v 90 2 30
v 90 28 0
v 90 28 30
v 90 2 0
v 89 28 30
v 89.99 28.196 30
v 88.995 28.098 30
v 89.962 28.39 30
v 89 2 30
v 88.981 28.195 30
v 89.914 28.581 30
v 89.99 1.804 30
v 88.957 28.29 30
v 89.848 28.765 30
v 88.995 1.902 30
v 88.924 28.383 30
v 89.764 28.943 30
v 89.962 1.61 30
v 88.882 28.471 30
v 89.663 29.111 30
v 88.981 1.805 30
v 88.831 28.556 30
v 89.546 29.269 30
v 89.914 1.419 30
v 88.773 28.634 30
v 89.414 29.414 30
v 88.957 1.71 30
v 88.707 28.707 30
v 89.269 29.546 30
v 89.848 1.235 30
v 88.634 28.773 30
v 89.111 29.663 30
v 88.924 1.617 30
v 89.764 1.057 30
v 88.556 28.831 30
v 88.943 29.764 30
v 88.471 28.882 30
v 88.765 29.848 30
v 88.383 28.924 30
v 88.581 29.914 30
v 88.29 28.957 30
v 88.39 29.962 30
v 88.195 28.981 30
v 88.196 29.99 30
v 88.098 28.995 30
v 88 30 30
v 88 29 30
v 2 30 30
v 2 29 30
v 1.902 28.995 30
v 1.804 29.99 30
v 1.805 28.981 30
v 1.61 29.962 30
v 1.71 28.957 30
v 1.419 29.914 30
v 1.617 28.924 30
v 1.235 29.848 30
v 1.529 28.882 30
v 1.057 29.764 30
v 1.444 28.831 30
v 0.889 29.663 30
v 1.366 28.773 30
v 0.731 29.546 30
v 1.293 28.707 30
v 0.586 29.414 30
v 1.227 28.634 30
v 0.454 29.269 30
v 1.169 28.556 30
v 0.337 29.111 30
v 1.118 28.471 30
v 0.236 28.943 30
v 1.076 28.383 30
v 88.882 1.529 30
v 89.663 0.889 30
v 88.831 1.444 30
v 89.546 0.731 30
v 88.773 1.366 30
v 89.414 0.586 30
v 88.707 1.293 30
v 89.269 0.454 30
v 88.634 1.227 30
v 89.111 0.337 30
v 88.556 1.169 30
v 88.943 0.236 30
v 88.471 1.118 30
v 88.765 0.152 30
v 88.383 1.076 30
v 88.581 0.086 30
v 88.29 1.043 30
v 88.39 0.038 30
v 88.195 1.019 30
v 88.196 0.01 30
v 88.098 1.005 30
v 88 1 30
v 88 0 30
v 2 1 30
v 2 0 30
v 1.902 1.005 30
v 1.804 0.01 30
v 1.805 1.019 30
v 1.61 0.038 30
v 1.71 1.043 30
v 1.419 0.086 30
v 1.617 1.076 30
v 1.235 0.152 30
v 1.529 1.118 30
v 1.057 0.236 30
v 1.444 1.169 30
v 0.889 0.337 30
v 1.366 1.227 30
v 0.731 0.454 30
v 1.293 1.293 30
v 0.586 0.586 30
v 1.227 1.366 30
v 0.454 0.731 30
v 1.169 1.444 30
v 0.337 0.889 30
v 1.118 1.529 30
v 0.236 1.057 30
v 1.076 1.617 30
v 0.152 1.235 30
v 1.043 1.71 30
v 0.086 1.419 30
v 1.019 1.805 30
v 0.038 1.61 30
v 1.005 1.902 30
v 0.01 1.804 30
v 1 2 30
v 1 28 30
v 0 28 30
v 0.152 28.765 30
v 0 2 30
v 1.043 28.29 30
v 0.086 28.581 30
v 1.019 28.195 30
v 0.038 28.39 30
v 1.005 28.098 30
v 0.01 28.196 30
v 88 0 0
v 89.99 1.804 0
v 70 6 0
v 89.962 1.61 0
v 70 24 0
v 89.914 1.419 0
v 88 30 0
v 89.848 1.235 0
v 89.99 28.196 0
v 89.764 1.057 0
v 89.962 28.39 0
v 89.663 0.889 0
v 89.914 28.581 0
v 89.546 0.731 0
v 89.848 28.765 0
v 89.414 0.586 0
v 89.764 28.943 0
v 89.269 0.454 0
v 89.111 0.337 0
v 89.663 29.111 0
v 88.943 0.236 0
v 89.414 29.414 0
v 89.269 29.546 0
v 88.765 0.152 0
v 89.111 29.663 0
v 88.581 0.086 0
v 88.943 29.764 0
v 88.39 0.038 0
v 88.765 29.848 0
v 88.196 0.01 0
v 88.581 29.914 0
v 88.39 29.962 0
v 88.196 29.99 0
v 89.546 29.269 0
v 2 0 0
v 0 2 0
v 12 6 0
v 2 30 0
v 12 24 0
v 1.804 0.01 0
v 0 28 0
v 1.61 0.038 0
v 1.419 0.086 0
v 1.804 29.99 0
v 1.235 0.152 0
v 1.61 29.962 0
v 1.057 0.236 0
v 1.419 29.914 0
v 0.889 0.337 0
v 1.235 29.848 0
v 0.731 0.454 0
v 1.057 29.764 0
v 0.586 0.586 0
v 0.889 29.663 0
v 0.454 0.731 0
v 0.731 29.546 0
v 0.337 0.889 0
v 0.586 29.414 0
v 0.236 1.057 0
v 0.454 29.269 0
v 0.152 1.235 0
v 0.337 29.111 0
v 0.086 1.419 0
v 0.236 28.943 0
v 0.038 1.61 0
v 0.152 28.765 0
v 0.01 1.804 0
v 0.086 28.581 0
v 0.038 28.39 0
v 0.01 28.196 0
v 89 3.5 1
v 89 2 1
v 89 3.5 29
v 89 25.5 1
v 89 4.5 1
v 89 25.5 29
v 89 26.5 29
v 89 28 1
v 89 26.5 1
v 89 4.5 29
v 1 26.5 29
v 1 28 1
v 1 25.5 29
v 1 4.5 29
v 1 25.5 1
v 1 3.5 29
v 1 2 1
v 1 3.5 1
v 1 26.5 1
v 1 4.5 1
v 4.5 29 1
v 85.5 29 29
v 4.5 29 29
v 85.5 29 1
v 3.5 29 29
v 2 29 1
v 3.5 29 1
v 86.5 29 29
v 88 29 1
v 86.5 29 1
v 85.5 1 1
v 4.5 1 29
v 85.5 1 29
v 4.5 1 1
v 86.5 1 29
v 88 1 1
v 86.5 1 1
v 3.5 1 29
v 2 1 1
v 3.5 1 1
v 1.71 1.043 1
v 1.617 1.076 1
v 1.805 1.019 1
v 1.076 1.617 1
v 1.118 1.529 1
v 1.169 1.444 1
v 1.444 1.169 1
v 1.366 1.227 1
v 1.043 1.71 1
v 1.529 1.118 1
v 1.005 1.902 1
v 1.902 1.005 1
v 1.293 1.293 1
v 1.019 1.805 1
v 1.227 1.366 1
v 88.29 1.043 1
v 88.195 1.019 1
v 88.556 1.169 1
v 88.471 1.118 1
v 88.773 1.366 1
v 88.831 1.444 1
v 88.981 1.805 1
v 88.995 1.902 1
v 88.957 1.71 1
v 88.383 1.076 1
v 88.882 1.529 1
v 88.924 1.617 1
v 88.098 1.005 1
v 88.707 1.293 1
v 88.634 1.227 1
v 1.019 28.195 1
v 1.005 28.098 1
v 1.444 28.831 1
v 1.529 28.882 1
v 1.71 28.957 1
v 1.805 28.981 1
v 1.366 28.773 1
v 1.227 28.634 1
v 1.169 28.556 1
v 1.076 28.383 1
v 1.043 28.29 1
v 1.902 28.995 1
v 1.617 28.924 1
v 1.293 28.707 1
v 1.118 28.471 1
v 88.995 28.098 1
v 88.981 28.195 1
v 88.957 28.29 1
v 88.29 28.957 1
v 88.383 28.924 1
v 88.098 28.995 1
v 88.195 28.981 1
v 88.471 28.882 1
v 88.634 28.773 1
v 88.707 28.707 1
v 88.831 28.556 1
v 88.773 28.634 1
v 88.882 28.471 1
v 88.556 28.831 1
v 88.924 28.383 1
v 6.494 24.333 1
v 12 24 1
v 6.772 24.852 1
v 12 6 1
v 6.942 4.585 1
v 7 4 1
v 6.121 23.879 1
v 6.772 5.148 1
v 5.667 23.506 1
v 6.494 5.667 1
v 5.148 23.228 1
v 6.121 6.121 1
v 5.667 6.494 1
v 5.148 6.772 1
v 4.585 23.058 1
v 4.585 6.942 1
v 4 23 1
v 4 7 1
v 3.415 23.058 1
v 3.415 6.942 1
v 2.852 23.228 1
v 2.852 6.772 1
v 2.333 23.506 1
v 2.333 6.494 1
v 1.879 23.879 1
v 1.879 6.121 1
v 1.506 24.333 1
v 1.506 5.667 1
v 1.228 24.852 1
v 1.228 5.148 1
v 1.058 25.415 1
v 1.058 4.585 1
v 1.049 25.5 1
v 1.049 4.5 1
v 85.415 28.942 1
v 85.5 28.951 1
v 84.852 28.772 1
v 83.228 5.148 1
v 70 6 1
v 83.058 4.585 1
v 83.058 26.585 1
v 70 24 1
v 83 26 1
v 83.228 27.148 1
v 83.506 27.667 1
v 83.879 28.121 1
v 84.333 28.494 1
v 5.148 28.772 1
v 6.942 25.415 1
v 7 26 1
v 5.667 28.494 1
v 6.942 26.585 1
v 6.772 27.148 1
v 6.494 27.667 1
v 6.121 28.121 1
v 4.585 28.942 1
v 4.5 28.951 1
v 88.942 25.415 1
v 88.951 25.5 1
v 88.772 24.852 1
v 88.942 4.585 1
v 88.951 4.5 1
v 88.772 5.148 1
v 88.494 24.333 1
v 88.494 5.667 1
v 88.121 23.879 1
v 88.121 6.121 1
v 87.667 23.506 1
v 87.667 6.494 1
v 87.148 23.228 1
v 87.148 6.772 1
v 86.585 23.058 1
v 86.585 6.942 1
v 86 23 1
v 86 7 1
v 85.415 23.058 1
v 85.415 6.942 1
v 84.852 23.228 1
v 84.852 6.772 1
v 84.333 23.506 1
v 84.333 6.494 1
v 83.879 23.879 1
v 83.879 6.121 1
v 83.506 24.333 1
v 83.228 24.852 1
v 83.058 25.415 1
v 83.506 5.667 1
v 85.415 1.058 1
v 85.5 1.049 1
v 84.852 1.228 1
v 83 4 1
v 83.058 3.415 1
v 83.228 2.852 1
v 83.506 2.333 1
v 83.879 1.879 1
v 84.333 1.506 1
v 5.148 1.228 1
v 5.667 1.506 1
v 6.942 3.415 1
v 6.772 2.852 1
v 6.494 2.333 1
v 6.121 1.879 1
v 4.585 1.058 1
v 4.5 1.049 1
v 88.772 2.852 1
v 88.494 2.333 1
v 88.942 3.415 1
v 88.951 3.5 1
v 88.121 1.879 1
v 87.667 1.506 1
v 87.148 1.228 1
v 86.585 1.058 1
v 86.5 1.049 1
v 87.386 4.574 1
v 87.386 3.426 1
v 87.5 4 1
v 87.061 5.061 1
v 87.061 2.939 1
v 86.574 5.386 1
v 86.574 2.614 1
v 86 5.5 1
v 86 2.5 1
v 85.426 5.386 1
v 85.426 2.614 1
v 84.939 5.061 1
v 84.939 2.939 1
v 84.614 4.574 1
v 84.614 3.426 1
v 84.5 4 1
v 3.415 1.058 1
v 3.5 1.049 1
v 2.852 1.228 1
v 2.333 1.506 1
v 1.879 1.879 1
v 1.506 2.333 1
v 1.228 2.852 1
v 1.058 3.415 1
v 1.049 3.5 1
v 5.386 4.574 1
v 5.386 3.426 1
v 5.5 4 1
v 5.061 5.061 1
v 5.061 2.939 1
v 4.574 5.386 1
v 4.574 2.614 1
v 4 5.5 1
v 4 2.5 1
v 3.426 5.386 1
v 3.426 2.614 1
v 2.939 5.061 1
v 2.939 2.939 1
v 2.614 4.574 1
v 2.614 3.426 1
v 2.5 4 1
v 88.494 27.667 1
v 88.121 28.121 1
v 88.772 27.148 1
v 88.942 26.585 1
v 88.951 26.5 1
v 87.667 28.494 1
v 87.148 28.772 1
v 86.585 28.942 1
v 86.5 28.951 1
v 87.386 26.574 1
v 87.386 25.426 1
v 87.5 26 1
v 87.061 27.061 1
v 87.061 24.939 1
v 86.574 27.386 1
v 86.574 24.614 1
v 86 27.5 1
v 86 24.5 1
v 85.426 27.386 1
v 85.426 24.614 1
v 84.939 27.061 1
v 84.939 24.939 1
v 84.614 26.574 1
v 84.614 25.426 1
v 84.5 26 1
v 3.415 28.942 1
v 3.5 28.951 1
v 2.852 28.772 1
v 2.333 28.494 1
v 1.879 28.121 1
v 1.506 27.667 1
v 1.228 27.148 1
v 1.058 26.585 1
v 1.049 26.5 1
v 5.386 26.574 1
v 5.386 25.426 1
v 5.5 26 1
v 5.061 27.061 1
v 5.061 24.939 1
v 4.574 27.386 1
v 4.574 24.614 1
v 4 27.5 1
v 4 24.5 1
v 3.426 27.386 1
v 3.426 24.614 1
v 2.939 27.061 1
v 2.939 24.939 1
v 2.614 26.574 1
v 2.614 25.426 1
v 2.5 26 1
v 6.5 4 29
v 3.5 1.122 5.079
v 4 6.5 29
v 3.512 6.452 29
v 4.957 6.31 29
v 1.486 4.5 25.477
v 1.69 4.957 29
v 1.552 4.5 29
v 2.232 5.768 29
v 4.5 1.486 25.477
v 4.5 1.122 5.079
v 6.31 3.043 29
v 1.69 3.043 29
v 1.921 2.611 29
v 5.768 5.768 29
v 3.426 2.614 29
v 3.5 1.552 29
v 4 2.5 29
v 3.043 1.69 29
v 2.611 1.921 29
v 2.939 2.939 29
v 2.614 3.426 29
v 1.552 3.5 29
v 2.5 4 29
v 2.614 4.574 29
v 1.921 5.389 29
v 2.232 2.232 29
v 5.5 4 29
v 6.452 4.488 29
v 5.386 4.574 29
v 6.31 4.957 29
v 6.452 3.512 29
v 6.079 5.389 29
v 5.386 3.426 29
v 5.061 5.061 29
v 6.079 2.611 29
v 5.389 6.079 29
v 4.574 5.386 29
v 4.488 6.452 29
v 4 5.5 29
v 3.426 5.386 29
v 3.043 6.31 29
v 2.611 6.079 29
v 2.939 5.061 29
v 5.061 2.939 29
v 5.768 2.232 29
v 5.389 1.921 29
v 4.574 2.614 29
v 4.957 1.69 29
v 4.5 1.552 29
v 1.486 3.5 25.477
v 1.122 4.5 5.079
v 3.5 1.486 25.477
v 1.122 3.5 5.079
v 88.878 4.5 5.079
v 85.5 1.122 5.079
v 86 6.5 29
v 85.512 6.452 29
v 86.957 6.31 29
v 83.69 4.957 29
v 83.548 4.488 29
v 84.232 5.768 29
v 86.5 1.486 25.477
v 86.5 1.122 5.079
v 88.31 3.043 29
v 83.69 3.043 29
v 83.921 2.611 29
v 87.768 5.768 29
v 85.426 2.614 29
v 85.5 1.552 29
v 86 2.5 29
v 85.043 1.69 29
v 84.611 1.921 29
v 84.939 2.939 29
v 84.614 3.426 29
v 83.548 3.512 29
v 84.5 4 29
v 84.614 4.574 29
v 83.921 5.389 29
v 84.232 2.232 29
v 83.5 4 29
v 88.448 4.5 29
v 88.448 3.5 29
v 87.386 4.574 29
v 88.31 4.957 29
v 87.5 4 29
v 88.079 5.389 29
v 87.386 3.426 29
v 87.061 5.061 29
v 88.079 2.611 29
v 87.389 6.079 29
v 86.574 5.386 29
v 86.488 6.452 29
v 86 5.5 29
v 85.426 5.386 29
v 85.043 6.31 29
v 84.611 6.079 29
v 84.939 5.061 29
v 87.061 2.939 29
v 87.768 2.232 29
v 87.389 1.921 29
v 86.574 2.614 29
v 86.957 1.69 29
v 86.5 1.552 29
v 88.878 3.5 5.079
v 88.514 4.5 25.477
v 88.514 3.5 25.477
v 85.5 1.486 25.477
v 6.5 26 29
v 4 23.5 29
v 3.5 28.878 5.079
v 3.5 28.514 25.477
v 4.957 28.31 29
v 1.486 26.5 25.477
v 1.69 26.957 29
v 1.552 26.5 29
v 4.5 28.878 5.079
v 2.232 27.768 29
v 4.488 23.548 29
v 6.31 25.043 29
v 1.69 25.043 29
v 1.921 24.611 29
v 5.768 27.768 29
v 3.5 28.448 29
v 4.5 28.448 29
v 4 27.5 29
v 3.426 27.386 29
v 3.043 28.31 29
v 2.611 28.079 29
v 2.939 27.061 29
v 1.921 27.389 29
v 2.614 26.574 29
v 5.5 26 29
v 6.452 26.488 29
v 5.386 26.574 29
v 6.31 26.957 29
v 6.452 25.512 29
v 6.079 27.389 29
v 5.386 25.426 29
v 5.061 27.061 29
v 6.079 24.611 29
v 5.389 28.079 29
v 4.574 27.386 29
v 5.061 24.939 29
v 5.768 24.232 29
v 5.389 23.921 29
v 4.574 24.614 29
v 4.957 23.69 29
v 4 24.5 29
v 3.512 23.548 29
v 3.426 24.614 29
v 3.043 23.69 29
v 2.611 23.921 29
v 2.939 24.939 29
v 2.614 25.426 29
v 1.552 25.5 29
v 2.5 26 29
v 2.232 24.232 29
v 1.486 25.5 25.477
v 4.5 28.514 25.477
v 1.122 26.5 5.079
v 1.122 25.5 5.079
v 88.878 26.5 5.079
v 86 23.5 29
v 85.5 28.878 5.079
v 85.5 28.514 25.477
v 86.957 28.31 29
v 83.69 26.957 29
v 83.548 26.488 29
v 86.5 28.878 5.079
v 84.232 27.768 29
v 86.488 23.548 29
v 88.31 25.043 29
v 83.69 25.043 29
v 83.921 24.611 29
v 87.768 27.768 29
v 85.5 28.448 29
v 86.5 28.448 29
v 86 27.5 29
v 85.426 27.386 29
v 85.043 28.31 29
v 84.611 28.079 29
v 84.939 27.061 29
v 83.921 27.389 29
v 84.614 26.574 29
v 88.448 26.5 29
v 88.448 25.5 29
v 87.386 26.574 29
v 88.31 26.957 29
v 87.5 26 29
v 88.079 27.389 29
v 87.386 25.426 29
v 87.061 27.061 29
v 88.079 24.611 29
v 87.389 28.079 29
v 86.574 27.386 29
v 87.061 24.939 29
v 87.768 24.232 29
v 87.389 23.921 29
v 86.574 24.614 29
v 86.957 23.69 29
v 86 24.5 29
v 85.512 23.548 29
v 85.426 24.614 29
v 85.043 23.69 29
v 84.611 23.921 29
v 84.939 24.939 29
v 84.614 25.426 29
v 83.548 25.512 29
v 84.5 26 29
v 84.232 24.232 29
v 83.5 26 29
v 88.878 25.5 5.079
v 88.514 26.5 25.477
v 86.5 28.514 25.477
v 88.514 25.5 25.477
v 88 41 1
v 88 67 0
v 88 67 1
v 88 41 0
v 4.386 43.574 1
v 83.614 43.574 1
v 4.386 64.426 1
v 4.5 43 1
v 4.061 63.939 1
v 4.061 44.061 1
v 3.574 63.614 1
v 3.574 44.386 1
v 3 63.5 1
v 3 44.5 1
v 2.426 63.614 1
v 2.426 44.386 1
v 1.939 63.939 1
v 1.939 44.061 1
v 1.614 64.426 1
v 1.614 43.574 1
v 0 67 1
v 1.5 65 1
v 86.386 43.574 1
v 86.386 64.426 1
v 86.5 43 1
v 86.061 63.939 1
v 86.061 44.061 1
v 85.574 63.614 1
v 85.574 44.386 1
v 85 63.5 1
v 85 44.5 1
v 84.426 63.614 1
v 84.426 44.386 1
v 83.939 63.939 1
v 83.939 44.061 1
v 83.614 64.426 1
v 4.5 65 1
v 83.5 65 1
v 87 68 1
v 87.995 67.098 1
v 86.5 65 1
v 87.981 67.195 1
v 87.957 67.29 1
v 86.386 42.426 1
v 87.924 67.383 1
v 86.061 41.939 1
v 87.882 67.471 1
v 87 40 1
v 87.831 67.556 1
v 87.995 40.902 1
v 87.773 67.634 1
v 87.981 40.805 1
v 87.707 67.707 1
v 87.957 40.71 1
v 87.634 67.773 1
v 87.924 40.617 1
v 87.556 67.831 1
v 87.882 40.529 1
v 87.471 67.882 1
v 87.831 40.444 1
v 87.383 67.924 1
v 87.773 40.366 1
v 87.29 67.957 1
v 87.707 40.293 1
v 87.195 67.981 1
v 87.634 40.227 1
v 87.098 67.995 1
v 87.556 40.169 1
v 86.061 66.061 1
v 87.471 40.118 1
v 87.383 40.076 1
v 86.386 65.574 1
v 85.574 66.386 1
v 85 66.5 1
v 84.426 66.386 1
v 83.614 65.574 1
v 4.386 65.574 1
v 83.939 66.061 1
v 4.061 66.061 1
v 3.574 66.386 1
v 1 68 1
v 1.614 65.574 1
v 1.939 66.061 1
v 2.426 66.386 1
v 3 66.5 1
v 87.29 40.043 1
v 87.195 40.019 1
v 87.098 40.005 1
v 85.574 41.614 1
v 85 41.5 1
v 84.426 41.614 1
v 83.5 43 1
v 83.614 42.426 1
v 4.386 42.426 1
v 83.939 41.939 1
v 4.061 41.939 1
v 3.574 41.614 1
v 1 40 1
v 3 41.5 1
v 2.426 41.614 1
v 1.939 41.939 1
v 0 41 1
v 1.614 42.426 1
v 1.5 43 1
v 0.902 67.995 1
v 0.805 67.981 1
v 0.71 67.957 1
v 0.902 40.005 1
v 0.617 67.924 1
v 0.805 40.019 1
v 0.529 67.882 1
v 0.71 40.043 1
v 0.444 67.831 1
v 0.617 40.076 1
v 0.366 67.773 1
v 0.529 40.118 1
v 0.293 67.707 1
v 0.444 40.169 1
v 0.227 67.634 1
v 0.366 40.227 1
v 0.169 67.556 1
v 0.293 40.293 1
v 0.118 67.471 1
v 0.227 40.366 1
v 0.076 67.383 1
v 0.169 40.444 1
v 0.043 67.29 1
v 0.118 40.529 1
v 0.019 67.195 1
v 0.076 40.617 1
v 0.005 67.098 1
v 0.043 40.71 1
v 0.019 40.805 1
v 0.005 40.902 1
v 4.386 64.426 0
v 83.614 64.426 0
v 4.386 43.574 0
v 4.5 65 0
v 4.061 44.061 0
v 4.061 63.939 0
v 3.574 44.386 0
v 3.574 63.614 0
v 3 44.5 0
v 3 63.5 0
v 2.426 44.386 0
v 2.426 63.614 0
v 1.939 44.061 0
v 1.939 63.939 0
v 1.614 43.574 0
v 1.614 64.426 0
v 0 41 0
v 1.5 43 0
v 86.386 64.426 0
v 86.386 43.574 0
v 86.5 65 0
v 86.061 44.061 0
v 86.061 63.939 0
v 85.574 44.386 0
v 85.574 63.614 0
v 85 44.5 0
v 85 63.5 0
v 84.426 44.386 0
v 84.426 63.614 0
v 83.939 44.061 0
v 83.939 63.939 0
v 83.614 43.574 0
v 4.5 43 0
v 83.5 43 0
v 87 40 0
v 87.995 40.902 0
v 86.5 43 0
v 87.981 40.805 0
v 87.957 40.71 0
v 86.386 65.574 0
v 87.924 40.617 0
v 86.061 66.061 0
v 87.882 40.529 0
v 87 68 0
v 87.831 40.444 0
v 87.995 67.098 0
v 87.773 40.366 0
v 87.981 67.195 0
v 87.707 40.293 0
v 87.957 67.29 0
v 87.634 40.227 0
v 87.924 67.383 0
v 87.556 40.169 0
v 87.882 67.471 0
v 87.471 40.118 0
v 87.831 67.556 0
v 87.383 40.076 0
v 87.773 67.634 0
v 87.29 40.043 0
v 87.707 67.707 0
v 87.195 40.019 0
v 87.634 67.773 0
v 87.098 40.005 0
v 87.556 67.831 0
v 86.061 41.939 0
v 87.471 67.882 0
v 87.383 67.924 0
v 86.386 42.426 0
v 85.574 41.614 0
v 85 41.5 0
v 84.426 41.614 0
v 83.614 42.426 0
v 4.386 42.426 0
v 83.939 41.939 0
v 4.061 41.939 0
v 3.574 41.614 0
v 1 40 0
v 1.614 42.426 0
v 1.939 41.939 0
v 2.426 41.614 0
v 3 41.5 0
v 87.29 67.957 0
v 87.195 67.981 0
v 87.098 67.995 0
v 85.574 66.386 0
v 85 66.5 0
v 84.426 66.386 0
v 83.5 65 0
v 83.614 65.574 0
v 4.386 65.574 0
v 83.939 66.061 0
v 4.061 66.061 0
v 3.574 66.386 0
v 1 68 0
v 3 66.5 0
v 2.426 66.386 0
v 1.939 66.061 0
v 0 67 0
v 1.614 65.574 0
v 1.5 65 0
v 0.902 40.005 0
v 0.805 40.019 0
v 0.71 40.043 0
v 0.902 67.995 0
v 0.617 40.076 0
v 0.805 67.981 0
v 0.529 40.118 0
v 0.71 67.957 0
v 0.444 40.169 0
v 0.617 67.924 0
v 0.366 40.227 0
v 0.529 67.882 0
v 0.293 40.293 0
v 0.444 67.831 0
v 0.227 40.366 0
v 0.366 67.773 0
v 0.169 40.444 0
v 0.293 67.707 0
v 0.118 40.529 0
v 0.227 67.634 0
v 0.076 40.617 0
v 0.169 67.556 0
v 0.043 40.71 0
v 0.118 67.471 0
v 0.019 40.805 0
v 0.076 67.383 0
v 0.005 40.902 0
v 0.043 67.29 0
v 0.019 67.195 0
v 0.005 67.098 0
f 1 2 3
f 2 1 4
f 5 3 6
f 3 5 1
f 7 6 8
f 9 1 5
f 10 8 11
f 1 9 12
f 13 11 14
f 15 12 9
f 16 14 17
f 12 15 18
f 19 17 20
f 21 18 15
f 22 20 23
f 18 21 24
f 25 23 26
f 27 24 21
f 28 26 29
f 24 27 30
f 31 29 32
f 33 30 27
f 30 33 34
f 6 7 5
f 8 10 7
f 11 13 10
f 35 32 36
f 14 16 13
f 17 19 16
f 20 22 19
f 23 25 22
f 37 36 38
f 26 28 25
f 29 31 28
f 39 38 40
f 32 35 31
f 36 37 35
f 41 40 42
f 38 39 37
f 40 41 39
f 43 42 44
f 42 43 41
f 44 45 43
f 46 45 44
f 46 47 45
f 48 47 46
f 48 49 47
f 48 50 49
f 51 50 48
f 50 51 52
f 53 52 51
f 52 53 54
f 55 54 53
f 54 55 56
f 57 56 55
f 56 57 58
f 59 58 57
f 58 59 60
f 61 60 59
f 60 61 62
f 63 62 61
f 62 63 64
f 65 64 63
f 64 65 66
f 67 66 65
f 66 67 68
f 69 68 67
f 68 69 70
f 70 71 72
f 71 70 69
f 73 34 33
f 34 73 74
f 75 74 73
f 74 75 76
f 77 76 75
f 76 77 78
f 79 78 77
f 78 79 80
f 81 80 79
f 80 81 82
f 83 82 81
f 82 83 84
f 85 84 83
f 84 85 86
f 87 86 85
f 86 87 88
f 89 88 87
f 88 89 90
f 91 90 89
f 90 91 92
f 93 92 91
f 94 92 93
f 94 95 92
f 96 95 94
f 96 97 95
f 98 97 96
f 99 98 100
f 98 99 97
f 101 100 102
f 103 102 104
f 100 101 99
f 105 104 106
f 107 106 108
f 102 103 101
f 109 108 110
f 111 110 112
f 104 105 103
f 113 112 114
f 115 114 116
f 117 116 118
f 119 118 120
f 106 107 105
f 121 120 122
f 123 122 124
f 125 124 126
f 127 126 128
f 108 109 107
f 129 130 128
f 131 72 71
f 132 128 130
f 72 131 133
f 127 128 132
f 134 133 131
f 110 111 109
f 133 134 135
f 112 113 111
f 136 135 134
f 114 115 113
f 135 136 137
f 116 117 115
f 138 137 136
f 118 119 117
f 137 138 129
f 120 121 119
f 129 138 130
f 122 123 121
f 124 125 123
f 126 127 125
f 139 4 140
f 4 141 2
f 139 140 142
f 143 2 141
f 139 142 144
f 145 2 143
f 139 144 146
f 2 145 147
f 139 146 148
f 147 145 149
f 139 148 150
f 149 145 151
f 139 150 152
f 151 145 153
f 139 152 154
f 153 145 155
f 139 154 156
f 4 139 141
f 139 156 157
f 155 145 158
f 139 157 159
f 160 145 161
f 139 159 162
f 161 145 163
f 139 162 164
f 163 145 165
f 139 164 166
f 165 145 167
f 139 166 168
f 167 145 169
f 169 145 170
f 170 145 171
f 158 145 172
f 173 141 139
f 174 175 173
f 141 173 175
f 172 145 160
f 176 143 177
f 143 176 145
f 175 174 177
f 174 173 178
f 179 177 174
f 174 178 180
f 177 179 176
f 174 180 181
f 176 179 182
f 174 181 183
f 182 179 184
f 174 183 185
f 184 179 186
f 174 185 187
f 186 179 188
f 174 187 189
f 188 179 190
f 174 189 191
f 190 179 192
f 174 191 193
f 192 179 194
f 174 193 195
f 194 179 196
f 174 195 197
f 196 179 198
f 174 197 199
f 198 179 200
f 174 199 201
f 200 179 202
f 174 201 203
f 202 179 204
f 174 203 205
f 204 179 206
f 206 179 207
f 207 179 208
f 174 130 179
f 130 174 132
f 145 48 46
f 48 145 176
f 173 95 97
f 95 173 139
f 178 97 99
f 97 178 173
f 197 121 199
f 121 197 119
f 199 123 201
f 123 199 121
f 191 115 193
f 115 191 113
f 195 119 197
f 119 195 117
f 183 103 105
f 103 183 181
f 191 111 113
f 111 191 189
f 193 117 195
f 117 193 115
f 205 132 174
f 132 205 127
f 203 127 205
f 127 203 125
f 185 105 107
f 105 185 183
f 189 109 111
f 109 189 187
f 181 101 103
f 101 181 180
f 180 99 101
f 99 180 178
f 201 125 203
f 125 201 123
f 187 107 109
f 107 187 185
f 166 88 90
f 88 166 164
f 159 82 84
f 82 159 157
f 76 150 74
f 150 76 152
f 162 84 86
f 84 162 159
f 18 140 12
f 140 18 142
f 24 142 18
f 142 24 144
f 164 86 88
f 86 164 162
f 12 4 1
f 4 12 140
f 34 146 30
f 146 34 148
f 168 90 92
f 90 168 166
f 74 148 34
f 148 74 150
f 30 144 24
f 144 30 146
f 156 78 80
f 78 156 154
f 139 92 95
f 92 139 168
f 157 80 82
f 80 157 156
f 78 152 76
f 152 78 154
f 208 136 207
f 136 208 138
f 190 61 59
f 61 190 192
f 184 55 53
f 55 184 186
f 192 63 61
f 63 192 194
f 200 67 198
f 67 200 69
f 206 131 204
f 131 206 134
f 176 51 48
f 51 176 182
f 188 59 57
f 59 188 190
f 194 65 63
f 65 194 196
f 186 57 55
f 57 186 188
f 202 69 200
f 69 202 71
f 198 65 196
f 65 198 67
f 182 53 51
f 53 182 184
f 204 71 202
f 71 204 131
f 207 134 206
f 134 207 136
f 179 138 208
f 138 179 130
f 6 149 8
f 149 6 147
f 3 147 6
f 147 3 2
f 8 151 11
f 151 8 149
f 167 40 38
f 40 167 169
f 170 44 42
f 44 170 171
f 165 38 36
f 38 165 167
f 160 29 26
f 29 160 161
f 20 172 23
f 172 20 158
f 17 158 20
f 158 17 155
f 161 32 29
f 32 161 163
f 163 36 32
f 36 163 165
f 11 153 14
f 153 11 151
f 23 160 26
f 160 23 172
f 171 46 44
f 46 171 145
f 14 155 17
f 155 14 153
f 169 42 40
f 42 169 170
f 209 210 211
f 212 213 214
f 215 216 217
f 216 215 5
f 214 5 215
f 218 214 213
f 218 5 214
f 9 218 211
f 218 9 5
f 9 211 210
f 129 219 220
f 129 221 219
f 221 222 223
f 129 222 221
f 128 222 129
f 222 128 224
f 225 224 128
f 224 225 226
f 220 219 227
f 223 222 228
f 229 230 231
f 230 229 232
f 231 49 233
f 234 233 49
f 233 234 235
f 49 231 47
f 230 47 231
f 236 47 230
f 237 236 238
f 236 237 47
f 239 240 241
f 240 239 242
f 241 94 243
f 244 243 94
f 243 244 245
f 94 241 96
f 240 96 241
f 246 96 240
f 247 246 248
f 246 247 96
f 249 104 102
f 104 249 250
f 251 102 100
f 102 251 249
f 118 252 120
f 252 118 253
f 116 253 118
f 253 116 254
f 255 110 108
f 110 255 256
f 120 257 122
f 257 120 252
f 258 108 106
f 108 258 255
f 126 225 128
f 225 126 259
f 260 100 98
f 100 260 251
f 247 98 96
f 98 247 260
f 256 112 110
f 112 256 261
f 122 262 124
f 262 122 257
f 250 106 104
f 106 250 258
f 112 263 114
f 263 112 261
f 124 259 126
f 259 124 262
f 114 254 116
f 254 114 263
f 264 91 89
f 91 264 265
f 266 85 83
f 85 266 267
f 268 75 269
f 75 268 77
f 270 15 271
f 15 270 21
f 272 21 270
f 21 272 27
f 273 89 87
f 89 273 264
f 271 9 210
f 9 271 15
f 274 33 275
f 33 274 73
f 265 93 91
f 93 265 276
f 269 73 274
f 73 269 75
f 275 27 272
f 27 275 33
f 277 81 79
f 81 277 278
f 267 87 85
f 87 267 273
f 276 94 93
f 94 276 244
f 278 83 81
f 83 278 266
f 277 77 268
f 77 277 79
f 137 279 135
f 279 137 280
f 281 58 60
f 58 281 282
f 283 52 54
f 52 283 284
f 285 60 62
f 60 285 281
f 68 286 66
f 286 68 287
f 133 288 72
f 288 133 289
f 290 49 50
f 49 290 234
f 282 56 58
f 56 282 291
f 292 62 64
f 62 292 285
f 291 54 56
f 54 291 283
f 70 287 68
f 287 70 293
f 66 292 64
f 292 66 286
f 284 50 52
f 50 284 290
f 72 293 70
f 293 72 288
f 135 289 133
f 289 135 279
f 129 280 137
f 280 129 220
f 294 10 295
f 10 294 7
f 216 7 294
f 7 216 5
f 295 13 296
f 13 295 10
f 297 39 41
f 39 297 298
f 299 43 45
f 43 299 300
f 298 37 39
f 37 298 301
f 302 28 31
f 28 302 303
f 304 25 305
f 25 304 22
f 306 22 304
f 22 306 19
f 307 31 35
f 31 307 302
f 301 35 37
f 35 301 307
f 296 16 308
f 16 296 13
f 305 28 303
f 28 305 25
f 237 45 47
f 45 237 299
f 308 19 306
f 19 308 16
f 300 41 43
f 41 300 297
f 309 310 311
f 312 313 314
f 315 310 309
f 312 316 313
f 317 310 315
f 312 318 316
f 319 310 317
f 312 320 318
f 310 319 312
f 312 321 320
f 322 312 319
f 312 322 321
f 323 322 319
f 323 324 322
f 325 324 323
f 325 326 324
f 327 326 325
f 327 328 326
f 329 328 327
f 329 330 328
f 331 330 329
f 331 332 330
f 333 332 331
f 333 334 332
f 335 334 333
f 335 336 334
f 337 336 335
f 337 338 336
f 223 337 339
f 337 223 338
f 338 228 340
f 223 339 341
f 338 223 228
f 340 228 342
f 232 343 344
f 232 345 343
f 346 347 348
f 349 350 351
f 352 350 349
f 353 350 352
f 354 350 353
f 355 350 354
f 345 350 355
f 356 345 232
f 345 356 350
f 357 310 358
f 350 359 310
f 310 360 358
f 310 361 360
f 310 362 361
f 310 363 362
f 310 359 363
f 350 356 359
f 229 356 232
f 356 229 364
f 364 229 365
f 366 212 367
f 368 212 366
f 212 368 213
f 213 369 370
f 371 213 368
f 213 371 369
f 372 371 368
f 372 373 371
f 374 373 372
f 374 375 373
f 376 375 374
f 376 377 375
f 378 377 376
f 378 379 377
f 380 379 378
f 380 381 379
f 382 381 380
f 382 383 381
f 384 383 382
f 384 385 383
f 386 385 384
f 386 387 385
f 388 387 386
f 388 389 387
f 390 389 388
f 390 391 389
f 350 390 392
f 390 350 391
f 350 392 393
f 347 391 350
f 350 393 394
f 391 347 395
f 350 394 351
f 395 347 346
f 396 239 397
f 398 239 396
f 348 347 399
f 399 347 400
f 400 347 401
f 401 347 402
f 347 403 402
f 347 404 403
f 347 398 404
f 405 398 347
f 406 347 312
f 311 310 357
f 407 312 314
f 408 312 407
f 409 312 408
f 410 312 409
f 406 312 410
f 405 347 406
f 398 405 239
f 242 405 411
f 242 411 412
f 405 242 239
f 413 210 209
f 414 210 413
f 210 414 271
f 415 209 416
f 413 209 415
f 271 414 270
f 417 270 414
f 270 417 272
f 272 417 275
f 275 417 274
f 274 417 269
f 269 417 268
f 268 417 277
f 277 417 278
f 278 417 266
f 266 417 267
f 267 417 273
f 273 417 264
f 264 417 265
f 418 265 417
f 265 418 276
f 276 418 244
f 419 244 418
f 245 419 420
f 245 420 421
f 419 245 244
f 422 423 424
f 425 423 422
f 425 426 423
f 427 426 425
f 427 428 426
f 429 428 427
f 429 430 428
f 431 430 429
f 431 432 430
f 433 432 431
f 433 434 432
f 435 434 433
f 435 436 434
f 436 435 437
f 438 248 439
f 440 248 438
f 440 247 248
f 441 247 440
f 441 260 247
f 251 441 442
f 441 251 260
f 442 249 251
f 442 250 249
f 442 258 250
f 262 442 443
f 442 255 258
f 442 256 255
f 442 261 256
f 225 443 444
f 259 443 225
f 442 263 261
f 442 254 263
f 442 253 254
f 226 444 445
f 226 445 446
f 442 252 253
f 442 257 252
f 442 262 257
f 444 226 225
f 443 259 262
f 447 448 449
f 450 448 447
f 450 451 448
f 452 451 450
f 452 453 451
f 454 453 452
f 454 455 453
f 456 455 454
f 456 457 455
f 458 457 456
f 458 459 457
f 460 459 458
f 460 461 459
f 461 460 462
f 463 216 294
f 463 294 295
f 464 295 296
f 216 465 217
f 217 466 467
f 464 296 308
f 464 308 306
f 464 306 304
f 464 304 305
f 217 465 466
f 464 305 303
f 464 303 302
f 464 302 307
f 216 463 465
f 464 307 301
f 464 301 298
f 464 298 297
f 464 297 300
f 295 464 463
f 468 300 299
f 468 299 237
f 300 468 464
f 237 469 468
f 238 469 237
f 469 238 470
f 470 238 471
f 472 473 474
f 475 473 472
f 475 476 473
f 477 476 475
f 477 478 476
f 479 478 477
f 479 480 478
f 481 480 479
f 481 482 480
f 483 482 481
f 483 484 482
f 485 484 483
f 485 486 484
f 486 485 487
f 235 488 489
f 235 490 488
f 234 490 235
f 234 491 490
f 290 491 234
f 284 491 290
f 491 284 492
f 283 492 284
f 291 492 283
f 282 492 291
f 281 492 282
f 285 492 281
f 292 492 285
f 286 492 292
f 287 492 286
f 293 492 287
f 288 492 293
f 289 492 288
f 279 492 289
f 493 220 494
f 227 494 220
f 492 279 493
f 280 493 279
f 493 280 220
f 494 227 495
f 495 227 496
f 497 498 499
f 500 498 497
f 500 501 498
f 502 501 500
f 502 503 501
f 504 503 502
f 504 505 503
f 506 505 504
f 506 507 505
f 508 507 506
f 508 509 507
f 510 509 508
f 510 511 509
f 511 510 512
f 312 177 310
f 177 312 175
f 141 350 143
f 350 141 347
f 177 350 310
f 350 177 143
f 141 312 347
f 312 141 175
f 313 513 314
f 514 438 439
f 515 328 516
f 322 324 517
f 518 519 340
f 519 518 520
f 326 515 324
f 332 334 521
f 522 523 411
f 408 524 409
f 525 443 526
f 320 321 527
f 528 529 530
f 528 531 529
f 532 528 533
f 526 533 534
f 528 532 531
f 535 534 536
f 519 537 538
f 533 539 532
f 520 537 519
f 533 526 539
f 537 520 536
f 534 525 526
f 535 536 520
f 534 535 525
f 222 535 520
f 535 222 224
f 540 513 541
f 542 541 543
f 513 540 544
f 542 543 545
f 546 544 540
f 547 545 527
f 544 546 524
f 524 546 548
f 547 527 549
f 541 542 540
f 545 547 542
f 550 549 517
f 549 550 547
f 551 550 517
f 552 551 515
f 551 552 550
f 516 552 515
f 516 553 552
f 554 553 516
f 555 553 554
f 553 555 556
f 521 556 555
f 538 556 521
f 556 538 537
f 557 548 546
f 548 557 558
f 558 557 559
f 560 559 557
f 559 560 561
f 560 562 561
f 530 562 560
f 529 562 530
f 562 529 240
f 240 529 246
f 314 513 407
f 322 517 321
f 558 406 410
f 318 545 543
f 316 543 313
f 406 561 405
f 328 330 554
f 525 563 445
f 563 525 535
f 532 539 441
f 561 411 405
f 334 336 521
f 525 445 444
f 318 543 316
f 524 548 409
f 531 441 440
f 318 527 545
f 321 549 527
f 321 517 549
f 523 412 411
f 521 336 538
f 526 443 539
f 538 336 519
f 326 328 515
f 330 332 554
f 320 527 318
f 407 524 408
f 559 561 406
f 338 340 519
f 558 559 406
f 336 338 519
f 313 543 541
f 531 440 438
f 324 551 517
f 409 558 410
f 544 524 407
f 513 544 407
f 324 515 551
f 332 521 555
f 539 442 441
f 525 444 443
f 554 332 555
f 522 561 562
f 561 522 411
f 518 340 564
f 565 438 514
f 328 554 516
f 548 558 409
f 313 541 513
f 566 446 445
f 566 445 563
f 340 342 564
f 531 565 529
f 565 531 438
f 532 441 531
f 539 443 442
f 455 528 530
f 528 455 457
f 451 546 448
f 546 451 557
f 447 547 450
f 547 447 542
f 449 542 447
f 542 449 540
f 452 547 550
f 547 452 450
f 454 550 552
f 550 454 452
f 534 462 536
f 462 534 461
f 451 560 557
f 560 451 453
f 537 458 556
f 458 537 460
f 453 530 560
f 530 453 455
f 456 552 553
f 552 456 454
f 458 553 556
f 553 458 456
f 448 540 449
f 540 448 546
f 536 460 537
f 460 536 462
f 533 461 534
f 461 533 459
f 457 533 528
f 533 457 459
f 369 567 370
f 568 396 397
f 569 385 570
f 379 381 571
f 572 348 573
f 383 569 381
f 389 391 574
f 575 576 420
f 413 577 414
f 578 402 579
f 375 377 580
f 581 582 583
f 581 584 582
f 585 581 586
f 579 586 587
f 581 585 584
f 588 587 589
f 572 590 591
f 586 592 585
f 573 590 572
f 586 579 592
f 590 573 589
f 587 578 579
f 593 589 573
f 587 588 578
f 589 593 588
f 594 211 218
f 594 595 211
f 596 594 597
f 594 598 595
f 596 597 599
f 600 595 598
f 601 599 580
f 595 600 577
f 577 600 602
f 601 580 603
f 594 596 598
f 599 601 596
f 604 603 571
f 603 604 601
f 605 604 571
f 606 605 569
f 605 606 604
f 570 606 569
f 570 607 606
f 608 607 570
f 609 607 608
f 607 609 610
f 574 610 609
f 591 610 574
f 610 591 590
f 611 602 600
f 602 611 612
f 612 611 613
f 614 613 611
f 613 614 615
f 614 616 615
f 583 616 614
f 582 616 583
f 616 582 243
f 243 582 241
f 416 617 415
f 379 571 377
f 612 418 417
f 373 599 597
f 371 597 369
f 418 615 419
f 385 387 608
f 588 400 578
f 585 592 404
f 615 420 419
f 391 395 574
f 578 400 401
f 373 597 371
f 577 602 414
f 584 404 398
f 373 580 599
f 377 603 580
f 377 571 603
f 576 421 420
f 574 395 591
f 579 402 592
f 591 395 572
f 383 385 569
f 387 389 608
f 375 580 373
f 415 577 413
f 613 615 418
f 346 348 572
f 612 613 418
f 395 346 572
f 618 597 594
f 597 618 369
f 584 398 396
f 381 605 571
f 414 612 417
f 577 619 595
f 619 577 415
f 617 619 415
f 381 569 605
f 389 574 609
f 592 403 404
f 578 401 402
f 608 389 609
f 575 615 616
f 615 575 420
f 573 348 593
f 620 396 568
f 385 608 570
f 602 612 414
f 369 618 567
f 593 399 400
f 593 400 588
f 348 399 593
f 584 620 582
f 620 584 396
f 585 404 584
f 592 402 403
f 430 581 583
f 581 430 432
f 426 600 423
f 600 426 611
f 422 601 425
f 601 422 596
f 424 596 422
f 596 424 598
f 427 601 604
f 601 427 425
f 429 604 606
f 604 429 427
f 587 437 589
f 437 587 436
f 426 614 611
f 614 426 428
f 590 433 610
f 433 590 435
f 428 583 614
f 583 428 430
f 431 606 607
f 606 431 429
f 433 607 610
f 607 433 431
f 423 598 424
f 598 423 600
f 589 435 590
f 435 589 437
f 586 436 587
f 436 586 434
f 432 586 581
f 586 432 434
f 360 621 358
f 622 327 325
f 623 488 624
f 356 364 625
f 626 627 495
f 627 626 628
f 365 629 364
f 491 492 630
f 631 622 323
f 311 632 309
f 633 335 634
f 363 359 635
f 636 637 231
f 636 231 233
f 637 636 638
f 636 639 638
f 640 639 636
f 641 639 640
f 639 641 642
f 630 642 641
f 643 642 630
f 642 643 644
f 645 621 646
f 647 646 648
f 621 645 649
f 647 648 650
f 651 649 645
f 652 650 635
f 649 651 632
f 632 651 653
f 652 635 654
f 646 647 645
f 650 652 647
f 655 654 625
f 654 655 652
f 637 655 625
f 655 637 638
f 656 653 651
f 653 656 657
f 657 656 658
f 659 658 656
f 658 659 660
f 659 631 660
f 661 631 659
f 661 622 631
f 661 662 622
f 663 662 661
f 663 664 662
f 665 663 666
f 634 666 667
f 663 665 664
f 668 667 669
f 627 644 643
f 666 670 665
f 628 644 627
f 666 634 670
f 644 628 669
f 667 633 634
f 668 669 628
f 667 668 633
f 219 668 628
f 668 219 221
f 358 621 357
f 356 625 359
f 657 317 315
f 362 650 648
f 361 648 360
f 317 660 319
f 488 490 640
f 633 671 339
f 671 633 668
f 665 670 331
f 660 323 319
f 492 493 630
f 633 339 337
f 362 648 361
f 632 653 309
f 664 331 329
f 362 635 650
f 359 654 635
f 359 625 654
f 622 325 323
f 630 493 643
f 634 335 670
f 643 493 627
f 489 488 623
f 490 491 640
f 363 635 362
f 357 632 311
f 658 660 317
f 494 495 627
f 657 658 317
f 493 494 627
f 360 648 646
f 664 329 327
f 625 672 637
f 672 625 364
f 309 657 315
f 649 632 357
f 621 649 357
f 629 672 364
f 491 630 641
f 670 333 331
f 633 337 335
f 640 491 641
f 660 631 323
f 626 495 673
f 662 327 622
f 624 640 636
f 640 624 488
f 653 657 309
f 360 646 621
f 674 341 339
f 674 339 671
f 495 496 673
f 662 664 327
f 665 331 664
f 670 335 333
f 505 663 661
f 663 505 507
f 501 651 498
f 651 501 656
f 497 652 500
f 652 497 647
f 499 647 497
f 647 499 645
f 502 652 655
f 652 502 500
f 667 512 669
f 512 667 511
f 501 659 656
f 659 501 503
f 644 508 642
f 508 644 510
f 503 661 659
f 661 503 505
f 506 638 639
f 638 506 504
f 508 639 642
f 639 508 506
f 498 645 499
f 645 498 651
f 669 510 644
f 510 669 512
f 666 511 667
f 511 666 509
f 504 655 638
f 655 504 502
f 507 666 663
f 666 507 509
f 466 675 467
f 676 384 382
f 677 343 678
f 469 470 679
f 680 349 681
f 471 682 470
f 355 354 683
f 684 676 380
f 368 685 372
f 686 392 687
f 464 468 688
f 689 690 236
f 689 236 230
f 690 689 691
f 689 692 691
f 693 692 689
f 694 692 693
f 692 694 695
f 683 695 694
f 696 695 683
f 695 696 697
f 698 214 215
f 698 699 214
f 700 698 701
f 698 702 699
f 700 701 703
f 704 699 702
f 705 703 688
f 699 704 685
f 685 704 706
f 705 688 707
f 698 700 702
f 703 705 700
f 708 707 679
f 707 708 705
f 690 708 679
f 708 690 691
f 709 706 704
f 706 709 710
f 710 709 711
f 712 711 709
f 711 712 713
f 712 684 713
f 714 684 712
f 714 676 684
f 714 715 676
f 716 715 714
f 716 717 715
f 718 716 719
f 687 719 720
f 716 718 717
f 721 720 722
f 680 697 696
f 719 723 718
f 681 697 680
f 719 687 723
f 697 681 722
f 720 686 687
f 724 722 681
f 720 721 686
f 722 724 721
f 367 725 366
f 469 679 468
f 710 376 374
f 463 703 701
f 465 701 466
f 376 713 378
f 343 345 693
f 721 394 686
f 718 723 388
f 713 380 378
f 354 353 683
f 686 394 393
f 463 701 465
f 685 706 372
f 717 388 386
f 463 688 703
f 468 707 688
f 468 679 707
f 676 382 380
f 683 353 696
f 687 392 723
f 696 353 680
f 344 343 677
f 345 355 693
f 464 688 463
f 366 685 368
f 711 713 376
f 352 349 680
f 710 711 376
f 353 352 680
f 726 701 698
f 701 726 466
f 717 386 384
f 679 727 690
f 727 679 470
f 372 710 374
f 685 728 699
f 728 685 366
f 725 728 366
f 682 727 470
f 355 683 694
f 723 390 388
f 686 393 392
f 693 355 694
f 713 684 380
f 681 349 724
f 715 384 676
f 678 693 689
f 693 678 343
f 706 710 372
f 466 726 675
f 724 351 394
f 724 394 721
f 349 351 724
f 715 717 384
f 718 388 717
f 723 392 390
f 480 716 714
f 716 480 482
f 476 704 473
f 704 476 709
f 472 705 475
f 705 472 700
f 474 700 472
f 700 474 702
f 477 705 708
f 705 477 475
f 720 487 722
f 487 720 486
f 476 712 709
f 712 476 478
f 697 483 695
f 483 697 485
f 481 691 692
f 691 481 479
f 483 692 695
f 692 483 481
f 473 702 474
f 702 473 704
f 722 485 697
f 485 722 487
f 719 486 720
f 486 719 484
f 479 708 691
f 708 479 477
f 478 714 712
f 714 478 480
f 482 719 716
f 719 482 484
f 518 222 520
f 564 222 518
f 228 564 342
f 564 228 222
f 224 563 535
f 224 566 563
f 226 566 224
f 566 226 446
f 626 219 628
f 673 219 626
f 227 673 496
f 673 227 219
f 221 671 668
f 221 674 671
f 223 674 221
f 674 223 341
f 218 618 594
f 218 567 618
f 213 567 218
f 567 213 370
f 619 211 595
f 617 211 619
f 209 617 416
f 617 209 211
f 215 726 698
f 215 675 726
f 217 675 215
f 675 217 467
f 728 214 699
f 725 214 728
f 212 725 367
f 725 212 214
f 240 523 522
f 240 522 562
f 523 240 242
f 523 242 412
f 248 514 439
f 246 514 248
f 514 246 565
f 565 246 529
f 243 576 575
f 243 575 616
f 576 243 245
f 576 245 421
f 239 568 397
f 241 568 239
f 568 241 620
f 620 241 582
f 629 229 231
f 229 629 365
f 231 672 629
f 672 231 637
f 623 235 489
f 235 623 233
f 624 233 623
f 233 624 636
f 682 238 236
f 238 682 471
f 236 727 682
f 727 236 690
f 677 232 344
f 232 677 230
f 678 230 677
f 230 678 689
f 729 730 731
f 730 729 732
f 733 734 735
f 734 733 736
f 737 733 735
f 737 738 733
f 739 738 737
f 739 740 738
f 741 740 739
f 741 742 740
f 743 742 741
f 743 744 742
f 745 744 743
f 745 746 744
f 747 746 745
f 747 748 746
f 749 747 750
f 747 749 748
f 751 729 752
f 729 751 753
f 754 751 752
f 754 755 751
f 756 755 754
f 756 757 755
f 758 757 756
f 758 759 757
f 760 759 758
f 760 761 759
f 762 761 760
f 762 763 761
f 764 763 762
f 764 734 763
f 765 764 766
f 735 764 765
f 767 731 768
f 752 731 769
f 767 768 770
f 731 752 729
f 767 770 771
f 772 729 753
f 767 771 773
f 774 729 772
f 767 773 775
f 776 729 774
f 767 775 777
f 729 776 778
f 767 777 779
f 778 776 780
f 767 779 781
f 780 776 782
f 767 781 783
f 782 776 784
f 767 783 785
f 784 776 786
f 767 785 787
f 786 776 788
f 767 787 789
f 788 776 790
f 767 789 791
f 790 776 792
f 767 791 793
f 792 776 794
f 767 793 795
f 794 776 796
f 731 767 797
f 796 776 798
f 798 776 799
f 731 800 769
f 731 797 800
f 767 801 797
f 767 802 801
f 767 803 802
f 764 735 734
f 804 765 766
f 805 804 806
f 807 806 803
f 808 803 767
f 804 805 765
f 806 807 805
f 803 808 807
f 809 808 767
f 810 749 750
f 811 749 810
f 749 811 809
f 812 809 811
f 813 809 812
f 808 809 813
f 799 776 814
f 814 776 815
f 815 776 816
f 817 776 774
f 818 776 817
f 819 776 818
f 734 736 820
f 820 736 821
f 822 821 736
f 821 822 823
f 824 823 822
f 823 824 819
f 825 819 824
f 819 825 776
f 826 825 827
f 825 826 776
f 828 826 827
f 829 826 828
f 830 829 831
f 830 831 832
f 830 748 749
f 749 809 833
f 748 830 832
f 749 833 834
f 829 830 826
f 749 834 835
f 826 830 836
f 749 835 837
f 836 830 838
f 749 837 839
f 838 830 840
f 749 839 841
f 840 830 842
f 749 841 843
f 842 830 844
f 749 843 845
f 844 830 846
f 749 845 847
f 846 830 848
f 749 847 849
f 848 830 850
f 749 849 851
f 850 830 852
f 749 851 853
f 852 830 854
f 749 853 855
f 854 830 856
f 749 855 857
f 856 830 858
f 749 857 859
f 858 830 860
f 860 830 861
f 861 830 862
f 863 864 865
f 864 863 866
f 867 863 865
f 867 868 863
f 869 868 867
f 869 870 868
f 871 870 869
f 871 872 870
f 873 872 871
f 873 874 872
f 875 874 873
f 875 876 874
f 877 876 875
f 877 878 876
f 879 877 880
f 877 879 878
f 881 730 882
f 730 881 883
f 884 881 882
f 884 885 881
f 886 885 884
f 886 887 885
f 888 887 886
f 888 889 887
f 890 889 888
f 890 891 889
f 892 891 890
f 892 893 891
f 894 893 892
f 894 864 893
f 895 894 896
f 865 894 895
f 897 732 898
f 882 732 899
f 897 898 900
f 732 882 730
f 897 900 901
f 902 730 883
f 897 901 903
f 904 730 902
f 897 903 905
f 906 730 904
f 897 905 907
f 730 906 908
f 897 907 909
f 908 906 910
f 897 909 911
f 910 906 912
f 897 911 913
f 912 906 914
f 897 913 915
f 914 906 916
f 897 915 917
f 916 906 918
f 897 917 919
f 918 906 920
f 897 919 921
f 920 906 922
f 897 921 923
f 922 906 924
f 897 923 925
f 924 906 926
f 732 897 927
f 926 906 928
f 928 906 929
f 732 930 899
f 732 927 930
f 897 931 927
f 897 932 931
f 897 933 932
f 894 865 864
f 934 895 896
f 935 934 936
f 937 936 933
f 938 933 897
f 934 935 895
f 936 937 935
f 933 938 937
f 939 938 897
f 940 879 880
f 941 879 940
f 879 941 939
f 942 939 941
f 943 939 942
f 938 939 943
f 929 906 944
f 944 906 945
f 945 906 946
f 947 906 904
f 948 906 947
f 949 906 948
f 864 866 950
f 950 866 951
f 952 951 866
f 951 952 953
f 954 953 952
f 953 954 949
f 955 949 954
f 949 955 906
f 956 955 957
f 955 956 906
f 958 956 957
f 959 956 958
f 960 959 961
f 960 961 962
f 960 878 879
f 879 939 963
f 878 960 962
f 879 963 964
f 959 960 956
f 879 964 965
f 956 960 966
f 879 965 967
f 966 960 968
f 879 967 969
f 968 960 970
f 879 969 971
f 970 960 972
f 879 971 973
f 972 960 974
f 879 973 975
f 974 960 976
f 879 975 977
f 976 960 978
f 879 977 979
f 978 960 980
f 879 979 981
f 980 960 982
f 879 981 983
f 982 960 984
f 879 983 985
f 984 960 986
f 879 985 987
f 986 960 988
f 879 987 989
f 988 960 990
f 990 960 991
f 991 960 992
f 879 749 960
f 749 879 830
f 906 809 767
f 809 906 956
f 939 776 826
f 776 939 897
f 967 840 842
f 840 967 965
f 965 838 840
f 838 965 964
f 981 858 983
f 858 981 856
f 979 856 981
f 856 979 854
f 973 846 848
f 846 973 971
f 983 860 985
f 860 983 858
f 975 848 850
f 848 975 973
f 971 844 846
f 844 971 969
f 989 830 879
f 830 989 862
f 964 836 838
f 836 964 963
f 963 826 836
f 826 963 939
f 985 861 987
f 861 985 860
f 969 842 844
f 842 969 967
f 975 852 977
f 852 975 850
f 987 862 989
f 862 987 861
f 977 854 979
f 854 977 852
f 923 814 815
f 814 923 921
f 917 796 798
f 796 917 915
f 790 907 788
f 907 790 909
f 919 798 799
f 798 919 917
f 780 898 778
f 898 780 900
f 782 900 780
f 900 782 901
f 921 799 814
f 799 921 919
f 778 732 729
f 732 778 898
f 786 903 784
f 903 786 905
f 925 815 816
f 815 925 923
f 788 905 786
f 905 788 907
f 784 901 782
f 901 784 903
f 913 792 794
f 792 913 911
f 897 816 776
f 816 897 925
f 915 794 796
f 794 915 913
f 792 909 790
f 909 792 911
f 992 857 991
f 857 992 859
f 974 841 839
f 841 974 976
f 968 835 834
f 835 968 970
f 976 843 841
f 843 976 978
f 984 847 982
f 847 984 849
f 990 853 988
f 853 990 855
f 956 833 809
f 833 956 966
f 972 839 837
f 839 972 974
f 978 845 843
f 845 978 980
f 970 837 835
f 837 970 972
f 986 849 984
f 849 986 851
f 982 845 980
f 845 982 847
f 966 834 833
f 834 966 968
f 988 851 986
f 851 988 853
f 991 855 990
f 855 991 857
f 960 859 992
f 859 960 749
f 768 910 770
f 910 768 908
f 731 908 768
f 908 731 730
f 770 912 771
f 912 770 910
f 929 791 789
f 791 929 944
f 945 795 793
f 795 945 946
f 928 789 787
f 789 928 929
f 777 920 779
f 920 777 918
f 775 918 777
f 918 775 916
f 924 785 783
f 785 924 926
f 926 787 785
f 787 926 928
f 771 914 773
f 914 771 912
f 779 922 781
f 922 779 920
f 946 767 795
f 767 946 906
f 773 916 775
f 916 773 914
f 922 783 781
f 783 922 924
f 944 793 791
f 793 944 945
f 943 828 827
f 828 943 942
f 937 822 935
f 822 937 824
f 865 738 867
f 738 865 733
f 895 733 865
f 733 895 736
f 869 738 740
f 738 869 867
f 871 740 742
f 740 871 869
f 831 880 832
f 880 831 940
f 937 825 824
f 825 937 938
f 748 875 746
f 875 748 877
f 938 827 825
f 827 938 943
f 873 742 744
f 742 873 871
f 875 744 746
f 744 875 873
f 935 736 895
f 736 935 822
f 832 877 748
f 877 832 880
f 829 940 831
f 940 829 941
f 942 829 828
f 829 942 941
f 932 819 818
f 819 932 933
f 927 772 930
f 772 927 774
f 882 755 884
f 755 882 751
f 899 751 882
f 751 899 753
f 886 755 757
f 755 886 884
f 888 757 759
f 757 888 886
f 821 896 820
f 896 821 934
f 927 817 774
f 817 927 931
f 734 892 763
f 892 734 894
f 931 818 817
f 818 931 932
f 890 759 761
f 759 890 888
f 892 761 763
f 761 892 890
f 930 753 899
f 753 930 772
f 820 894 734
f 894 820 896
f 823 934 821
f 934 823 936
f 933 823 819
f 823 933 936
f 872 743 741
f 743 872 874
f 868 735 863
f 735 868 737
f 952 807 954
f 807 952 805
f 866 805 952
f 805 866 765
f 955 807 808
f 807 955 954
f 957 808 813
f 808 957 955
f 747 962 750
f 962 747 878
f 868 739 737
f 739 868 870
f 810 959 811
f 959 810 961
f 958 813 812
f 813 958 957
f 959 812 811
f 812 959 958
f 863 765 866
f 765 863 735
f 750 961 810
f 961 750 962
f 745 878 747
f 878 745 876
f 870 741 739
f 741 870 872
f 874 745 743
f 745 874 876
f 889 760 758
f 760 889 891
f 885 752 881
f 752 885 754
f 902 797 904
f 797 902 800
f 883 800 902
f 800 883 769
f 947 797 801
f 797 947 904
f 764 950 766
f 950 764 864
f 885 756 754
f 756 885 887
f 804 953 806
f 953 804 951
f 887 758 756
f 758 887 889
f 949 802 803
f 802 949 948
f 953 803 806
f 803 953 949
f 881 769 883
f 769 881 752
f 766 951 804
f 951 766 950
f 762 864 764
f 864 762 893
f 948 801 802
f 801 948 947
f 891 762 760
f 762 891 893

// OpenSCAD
//Front plate width
width=90;
//Front plate height
height=30;
//Front plate thickness
thickness=1;
//Front plate corner radius
corner_radius=2;
corner_faces=64;

//Cutout width
cutout_width=58;
//Cutout height
cutout_height=18;
//Cutout corner radius
cutout_corner_radius=0;
cutout_corner_faces=32;
//Horizontal cutout offset from the center of the front plate
cutout_offset_x=-4; //from the center of the front plate
//Vertical cutout offset from the center of the front plate
cutout_offset_y=0; //from the center of the front plate

//Post base radius
post_base_radius=3;
//Post top radius
post_top_radius=2.5;
//Post hole radius
post_hole_radius=1.5;
//Post offsett from case edge
post_offset=4;
//Post support thickness
post_support_thickness=1;

//Rim (case) height 
rim_height=30;
//Rim thickness
rim_thickness=1;

//Backplate thickness
backplate_thickness=1;

parts_immersion=0.2;

//

module body (sizeX, sizeY, sizeZ, cornerRadius, cornerFaces)
{
	union()
	{
		difference()
		{
			cube([sizeX,sizeY,sizeZ]);		
			cube([cornerRadius,cornerRadius,sizeZ+thickness]);
			translate([sizeX-cornerRadius,0,0]) cube([cornerRadius,cornerRadius,sizeZ+thickness]);
			translate([0,sizeY-cornerRadius,0]) cube([cornerRadius,cornerRadius,sizeZ+thickness]);
			translate([sizeX-cornerRadius,sizeY-cornerRadius,0]) cube([cornerRadius,cornerRadius,sizeZ+thickness]);
		}
		translate([cornerRadius,cornerRadius,0]) cylinder(r=cornerRadius,h=sizeZ, $fn=cornerFaces);
		translate([sizeX-cornerRadius,cornerRadius,0]) cylinder(r=cornerRadius,h=sizeZ, $fn=cornerFaces);
		translate([cornerRadius,sizeY-cornerRadius,0]) cylinder(r=cornerRadius,h=sizeZ, $fn=cornerFaces);
		translate([sizeX-cornerRadius,sizeY-cornerRadius,0]) cylinder(r=cornerRadius,h=sizeZ, $fn=cornerFaces);
	}
}

module backplate (sizeX, sizeY, cornerRadius, cornerFaces)
{

    difference()
    {
        union()
        {
            difference()
            {
                cube([sizeX,sizeY,backplate_thickness]);		
                cube([cornerRadius,cornerRadius,backplate_thickness]);
                translate([sizeX-cornerRadius,0,0]) cube([cornerRadius,cornerRadius,backplate_thickness]);
                translate([0,sizeY-cornerRadius,0]) cube([cornerRadius,cornerRadius,backplate_thickness]);
                translate([sizeX-cornerRadius,sizeY-cornerRadius,0]) cube([cornerRadius,cornerRadius,backplate_thickness]);

            }
            translate([cornerRadius,cornerRadius,0]) cylinder(r=cornerRadius,h=backplate_thickness, $fn=cornerFaces);
            translate([sizeX-cornerRadius,cornerRadius,0]) cylinder(r=cornerRadius,h=backplate_thickness, $fn=cornerFaces);
            translate([cornerRadius,sizeY-cornerRadius,0]) cylinder(r=cornerRadius,h=backplate_thickness, $fn=cornerFaces);
            translate([sizeX-cornerRadius,sizeY-cornerRadius,0]) cylinder(r=cornerRadius,h=backplate_thickness, $fn=cornerFaces);
        }

        backplate_holes();
	}
}

module left_post_supports()
{
        //left top support
        translate([0+rim_thickness-parts_immersion,0+post_offset-post_support_thickness/2,thickness]) cube([post_offset-rim_thickness-post_top_radius+parts_immersion*2,post_support_thickness,rim_height-thickness-backplate_thickness]);
        //left bottom support
        translate([0+rim_thickness-parts_immersion,height-post_offset-post_support_thickness/2,thickness]) cube([post_offset-rim_thickness-post_top_radius+parts_immersion*2,post_support_thickness,rim_height-thickness-backplate_thickness]);
    
}

module bottom_post_supports()
{
        //left top support
        translate([0+post_offset-post_support_thickness/2,0+rim_thickness-parts_immersion,thickness]) cube([post_support_thickness,post_offset-rim_thickness-post_top_radius+parts_immersion*2,rim_height-thickness-backplate_thickness]);
        //left bottom support
        translate([0+width-post_offset-post_support_thickness/2,rim_thickness-parts_immersion,thickness]) cube([post_support_thickness,post_offset-rim_thickness-post_top_radius+parts_immersion*2,rim_height-thickness-backplate_thickness]);
}



module posts()
{

	union()
	{
		difference()
		{
            //left bottom post
			translate([0+post_offset,0+post_offset,thickness]) cylinder(r1=post_base_radius,r2=post_top_radius,h=rim_height-thickness-backplate_thickness, $fn=32);	
			translate([0+post_offset,0+post_offset,thickness]) cylinder(r=post_hole_radius,h=rim_height-thickness+0.5, $fn=16);
		}
        
		difference()
		{
            //right bottom post
			translate([width-post_offset,0+post_offset,thickness]) cylinder(r1=post_base_radius,r2=post_top_radius,h=rim_height-thickness-backplate_thickness, $fn=32);	
			translate([width-post_offset,0+post_offset,thickness]) cylinder(r=post_hole_radius,h=rim_height-thickness+0.5, $fn=16);
		}

		difference()
		{
            //left top post
			translate([0+post_offset,height-post_offset,thickness]) cylinder(r1=post_base_radius,r2=post_top_radius,h=rim_height-thickness-backplate_thickness, $fn=32);	
			translate([0+post_offset,height-post_offset,thickness]) cylinder(r=post_hole_radius,h=rim_height-thickness+0.5, $fn=16);
		}	

		difference()
		{
            //right top post
			translate([width-post_offset,height-post_offset,thickness]) cylinder(r1=post_base_radius,r2=post_top_radius,h=rim_height-thickness-backplate_thickness, $fn=32);	
			translate([width-post_offset,height-post_offset,thickness]) cylinder(r=post_hole_radius,h=rim_height-thickness+0.5, $fn=16);
		}
        
        left_post_supports();
        translate([width,0,0]) mirror([1,0,0]) left_post_supports();
        bottom_post_supports();
        translate([0,height,0]) mirror([0,1,0]) bottom_post_supports();
	}
}

module backplate_holes()
{

	union()
	{
            //left bottom hole
			translate([0+post_offset-rim_thickness,0+post_offset-rim_thickness,-0.5]) cylinder(r=post_hole_radius,h=backplate_thickness+1, $fn=16);
            //right bottom hole
			translate([width-post_offset-rim_thickness,0+post_offset-rim_thickness,-0.5]) cylinder(r=post_hole_radius,h=backplate_thickness+1, $fn=16);
            //left top hole
			translate([0+post_offset-rim_thickness,height-post_offset-rim_thickness,-0.5]) cylinder(r=post_hole_radius,h=backplate_thickness+1, $fn=16);
            //right top hole
			translate([width-post_offset-rim_thickness,height-post_offset-rim_thickness,-0.5]) cylinder(r=post_hole_radius,h=backplate_thickness+1, $fn=16);
	}
}

difference()
{
    body (width, height,rim_height, corner_radius, corner_faces);
    translate([rim_thickness,rim_thickness,0])
    body (width-(2*rim_thickness), height-(2*rim_thickness),rim_height, corner_radius-rim_thickness, corner_faces);
}

union()
{
    difference()
    {
        //base body
        body (width, height, thickness, corner_radius, corner_faces);

        //display cutout
        translate([0+(width-cutout_width)/2+cutout_offset_x,0+(height-cutout_height)/2+cutout_offset_y,0])
        body(cutout_width,cutout_height,10,cutout_corner_radius,cutout_corner_faces);

    }
    //posts
    translate([0,0,0])
    posts();
    translate([0,height+10,0])

    //backplate
    backplate(width-2*rim_thickness, height-2*rim_thickness, corner_radius-rim_thickness, corner_faces);
}
